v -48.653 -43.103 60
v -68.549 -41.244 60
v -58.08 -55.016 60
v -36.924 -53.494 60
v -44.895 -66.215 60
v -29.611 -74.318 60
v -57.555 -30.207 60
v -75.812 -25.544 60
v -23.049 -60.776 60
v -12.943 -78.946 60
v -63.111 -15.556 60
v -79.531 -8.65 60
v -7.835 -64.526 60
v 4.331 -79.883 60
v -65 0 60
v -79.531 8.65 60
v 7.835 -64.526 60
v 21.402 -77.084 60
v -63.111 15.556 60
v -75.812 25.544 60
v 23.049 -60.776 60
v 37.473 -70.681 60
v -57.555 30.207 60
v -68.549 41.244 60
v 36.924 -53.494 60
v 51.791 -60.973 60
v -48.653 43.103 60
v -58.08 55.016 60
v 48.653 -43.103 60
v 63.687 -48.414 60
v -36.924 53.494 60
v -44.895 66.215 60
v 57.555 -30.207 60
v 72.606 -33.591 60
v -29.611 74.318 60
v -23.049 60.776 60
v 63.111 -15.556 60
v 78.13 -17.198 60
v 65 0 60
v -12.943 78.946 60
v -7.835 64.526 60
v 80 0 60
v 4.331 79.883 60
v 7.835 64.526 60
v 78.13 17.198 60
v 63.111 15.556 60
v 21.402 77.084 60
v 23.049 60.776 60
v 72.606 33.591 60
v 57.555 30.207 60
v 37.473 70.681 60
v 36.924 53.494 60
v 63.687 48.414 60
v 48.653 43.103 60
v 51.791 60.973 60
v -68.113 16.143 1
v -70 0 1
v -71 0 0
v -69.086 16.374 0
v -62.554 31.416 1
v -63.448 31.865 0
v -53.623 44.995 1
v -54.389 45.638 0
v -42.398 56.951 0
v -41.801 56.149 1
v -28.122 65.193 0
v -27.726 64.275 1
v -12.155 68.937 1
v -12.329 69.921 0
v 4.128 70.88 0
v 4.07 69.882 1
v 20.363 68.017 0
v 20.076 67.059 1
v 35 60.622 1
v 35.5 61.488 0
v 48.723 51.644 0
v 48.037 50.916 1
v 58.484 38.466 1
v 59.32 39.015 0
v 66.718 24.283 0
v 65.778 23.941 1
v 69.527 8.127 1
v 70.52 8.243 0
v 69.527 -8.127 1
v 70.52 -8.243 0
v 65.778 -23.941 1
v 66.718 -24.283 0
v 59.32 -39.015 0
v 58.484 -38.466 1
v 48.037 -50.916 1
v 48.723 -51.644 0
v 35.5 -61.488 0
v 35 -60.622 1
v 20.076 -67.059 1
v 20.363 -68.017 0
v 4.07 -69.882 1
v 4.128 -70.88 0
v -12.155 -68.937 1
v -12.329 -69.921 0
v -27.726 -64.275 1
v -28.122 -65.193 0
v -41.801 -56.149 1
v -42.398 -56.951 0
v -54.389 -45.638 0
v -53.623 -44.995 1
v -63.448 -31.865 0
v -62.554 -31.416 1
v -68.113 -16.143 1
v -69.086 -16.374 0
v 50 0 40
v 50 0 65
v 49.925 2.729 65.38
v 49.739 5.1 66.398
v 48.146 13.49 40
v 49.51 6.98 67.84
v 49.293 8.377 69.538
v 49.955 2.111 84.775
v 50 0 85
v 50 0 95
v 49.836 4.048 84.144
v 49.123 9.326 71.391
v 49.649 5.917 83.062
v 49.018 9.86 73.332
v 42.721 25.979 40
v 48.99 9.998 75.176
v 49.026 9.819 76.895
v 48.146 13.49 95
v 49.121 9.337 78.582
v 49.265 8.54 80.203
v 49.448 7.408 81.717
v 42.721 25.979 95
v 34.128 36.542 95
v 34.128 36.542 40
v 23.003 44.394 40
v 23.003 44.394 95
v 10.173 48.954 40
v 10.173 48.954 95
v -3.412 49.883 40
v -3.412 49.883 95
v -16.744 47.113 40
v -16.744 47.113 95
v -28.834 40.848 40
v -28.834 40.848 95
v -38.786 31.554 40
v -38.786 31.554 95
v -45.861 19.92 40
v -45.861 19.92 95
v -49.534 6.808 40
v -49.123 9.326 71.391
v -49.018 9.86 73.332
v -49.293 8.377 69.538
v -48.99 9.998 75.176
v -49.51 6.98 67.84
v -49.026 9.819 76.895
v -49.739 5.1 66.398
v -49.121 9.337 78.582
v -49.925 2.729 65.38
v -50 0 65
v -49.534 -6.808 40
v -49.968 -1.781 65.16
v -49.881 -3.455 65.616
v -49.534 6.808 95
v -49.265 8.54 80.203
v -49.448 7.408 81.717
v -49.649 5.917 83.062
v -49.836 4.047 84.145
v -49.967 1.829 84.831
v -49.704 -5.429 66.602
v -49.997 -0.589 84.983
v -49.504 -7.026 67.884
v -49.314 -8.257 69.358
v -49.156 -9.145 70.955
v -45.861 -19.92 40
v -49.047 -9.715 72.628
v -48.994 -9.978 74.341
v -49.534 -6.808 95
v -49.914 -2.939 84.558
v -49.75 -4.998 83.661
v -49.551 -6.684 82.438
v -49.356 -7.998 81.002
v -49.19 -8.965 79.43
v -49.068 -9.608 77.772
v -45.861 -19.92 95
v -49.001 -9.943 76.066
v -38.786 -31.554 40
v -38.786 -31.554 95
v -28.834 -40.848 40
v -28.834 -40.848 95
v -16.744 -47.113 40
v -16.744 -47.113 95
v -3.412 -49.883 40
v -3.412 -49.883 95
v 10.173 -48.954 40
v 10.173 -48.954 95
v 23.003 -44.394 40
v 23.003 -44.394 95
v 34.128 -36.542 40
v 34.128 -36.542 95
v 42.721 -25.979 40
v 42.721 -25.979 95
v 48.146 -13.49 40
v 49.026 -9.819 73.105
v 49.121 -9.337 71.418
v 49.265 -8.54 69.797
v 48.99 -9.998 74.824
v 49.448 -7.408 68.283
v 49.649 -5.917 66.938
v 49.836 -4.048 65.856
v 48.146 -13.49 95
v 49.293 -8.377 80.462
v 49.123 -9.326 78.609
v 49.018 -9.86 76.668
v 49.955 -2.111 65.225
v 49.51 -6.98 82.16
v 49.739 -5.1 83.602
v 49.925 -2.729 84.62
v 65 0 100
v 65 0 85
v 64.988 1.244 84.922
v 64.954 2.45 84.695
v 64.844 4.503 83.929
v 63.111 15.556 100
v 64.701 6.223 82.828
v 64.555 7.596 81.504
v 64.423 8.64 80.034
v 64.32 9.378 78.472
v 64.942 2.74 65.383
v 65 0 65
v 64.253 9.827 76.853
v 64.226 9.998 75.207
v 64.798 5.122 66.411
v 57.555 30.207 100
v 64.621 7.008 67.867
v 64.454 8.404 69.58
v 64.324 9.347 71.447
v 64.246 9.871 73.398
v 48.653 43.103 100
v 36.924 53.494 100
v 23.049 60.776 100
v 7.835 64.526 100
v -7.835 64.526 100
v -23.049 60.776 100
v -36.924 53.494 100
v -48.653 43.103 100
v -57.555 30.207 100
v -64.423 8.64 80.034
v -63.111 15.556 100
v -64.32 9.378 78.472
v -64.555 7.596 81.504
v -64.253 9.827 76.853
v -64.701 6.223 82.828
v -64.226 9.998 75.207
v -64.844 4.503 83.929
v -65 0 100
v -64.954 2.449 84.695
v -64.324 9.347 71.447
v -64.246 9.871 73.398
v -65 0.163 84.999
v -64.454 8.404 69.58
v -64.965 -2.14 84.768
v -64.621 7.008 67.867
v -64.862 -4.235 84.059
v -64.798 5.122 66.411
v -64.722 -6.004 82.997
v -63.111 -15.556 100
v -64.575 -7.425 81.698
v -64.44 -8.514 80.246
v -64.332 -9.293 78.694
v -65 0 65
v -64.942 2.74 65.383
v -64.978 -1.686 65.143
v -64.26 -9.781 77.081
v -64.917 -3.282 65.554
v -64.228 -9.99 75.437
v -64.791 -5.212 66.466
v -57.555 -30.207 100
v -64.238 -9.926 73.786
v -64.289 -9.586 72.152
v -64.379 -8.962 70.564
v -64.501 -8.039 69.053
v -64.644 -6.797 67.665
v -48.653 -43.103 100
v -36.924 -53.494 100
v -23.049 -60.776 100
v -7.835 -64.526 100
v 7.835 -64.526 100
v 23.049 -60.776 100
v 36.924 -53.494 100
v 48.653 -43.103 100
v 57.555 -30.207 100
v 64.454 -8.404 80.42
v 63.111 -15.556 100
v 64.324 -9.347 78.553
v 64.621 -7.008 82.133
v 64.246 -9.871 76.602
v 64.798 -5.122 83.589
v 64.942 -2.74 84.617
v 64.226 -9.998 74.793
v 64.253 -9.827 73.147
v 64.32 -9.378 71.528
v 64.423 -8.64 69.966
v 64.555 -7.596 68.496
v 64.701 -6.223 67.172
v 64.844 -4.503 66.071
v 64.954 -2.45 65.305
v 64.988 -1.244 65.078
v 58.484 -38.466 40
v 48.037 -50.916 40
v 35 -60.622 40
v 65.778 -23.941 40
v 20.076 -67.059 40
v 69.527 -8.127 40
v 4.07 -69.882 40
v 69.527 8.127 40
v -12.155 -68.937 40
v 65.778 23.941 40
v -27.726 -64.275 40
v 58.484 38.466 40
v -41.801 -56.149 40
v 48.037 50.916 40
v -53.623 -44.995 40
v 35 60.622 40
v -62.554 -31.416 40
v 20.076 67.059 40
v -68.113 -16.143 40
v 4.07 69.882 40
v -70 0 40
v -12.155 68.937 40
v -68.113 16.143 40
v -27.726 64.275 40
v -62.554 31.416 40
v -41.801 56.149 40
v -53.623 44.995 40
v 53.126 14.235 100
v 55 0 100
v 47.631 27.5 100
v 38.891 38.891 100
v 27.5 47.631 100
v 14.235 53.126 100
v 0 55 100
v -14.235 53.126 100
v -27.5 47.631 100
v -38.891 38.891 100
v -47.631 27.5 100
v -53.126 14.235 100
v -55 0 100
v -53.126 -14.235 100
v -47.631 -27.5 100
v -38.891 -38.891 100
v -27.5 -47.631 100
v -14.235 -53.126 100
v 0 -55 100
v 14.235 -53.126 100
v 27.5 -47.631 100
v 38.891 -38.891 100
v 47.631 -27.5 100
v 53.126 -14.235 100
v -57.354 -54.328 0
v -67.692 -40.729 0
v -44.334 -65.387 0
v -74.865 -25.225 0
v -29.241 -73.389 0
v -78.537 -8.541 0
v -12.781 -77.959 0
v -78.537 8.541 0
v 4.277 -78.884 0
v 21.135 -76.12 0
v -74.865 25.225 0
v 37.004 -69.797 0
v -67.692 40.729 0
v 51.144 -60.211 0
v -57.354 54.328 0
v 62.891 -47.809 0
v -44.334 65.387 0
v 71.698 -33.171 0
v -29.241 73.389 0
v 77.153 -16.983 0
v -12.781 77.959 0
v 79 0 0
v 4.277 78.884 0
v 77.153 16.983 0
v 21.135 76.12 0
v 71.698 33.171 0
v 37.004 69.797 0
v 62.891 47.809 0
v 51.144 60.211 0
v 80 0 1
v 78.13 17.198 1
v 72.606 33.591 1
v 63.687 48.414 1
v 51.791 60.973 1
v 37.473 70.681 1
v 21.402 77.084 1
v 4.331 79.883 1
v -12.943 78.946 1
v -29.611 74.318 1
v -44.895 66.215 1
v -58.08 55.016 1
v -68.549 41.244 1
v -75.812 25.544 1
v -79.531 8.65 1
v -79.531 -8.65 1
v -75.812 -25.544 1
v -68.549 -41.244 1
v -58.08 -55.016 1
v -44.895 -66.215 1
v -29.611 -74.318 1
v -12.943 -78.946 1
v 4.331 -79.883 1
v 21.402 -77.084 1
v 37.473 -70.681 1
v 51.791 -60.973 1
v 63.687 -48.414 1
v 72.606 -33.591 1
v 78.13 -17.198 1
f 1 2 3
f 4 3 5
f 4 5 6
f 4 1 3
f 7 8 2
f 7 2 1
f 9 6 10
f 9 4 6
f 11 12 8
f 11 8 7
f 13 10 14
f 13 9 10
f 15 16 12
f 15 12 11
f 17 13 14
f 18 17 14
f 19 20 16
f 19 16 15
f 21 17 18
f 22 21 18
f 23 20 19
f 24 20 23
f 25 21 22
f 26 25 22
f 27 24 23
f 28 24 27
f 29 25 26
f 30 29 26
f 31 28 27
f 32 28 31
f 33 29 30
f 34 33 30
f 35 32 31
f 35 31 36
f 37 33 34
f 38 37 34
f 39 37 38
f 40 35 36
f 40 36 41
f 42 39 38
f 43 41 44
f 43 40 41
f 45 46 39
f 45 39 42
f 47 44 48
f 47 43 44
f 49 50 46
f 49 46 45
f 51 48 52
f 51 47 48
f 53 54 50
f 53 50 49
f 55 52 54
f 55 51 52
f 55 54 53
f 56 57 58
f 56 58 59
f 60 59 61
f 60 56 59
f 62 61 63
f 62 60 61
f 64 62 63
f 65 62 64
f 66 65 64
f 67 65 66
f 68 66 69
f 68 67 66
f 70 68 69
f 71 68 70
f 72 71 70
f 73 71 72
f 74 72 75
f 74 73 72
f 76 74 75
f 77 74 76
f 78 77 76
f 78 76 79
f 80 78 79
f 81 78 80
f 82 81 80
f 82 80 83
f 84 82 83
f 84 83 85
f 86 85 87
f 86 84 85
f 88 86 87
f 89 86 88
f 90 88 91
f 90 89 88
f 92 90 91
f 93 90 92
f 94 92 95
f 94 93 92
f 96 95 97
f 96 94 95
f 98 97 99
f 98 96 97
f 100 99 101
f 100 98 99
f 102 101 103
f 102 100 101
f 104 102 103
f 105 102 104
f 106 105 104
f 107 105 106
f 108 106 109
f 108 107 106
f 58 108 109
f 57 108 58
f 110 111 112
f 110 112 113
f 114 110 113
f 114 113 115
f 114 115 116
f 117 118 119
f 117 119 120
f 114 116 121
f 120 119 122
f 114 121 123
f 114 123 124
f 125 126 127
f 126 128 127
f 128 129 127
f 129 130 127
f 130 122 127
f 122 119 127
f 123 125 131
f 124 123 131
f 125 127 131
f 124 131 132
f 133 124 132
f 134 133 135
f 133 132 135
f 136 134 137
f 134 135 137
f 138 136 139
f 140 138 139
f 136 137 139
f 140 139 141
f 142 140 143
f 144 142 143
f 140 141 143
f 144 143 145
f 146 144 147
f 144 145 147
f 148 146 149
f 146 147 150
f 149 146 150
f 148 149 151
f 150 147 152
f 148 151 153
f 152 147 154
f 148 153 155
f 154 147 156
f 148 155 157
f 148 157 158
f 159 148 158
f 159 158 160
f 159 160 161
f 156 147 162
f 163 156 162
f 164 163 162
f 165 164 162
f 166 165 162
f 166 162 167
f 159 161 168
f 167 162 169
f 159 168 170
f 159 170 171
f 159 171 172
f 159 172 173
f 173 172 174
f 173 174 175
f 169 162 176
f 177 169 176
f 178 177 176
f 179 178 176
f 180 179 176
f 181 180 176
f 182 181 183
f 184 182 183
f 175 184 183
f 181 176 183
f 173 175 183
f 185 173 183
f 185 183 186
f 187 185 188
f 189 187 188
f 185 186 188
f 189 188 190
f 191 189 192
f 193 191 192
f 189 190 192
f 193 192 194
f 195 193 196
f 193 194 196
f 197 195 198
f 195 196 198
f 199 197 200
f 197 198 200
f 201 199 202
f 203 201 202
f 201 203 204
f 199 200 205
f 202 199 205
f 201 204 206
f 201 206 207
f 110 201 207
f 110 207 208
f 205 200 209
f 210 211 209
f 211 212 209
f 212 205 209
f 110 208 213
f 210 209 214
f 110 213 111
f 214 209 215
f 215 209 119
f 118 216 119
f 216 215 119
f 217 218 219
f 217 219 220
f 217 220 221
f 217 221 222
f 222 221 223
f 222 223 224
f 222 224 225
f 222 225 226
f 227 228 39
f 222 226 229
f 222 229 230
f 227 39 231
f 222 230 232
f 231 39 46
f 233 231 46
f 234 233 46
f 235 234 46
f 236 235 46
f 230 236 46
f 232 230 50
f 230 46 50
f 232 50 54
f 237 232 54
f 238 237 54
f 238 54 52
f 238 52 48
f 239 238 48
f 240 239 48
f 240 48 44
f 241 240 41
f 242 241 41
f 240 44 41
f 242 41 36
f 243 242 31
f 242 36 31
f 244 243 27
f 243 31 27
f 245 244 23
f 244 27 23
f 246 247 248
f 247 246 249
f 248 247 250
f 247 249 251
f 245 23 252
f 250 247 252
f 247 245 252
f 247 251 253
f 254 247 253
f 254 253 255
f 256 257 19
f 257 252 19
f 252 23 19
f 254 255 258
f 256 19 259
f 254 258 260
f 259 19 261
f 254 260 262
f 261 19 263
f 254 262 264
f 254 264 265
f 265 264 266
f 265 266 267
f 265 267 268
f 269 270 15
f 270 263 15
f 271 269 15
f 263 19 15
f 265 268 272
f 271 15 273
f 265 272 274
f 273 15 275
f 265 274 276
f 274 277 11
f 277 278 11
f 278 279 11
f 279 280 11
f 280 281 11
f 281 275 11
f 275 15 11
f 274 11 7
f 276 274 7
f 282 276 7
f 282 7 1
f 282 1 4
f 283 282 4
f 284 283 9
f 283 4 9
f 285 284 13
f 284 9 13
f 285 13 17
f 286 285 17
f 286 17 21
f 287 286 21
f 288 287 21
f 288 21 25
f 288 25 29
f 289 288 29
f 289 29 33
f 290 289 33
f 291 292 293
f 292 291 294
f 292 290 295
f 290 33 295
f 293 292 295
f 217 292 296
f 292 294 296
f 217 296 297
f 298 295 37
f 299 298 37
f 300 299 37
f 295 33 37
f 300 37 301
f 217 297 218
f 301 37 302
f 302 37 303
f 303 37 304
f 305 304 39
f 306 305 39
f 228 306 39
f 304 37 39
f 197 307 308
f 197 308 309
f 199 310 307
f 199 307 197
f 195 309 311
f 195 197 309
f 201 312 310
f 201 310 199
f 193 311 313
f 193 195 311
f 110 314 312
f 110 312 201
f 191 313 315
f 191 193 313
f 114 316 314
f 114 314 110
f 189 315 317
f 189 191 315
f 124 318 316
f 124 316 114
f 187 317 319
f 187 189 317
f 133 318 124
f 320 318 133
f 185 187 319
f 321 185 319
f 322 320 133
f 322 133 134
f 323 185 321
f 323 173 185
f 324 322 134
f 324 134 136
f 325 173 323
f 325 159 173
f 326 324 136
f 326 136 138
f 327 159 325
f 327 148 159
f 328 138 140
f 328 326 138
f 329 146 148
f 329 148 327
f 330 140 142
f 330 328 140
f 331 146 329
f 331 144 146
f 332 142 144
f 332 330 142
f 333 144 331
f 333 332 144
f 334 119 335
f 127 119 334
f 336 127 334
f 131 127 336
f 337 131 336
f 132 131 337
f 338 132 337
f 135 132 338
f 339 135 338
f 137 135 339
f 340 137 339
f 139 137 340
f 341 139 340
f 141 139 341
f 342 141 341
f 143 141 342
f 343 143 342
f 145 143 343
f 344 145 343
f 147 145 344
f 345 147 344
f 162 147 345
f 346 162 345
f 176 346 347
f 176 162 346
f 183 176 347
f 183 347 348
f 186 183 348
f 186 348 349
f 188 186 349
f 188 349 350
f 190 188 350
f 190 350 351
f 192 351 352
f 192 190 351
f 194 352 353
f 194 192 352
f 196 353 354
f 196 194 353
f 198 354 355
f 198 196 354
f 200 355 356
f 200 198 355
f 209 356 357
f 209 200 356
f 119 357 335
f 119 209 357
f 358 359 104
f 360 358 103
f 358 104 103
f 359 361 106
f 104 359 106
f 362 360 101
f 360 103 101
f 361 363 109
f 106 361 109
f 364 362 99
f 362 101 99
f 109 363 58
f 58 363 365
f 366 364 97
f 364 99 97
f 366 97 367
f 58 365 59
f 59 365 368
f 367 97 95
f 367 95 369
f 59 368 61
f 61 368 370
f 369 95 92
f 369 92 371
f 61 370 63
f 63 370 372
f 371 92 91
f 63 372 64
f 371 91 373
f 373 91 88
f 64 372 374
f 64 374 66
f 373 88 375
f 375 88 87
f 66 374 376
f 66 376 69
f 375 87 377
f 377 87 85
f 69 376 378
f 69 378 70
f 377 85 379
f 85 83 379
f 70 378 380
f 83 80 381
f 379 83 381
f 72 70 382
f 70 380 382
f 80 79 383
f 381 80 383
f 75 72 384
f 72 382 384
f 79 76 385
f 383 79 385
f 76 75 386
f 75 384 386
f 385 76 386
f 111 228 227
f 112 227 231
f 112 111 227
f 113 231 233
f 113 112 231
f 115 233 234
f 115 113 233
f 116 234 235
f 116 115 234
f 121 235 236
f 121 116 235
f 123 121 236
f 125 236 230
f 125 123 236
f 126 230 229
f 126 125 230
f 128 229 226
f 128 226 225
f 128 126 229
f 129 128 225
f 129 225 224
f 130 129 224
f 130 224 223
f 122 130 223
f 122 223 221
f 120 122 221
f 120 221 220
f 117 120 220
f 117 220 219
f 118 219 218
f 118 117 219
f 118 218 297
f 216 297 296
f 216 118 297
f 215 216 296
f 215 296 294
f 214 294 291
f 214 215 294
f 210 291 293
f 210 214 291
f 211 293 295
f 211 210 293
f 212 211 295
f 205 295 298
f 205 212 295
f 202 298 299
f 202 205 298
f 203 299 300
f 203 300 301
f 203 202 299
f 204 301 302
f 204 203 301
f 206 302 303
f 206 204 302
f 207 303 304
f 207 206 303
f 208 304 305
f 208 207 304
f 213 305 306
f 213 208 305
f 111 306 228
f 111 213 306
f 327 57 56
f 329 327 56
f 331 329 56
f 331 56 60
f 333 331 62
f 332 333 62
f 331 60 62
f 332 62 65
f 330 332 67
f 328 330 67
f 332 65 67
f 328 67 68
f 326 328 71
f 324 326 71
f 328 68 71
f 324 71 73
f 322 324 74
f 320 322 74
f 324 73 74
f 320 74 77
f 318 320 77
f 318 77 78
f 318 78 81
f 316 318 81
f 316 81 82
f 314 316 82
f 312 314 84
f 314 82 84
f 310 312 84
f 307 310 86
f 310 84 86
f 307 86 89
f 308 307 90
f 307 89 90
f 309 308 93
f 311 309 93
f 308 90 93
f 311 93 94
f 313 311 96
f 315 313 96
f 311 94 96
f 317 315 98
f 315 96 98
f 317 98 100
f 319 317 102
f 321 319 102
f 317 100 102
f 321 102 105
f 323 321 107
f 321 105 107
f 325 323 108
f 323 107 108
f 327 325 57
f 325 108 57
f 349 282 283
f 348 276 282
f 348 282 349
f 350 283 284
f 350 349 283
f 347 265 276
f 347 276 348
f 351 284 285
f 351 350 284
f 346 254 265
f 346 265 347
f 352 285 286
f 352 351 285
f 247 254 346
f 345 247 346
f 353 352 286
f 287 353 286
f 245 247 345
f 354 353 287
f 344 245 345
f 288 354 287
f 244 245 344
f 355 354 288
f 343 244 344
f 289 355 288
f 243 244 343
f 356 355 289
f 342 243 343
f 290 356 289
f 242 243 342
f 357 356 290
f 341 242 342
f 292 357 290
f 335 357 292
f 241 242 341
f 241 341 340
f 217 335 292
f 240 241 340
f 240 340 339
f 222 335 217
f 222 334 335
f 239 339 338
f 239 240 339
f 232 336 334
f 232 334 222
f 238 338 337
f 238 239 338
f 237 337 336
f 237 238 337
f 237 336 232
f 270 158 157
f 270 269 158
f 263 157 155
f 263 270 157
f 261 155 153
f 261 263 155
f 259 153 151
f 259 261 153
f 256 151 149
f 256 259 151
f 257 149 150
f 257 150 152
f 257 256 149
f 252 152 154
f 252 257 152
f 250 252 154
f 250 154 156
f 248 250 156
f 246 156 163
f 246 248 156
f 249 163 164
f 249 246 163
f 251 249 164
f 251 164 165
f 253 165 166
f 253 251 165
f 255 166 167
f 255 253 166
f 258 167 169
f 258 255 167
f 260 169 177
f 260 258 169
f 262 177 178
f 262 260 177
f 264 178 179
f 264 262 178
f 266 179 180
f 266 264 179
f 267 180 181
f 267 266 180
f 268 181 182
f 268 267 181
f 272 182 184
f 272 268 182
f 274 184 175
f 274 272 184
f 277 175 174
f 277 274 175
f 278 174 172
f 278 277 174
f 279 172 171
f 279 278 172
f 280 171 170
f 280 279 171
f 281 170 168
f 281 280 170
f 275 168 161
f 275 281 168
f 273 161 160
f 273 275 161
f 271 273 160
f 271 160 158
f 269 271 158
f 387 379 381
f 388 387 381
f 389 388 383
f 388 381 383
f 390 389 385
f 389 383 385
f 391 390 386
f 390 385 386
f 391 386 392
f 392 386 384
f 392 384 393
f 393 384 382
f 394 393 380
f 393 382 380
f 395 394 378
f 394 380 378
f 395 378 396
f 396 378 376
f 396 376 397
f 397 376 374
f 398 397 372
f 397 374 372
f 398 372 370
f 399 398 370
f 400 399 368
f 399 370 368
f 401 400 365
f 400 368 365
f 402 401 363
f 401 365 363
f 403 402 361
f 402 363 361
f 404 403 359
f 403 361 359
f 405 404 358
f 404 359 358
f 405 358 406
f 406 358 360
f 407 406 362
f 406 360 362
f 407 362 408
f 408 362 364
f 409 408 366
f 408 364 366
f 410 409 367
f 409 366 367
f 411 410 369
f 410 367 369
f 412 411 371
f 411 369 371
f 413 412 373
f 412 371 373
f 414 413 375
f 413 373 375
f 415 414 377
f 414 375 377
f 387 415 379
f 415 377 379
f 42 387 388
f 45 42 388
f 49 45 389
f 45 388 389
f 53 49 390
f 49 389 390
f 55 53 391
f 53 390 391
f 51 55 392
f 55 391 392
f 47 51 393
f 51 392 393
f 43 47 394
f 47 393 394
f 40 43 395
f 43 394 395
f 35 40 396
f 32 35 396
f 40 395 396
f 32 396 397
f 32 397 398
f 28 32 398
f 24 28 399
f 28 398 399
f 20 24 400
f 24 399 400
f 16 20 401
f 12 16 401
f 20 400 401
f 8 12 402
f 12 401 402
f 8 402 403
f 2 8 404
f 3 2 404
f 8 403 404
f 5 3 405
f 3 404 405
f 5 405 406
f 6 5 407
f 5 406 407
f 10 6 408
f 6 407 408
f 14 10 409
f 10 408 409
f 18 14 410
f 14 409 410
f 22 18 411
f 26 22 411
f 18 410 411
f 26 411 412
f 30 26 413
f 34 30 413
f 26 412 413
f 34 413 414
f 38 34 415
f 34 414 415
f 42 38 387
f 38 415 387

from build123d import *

# Parameters (mm, degrees)
SKETCH_1_R               = 80
EXTRUDE_1_DEPTH          = 60
SKETCH_2_R               = 65
EXTRUDE_2_DEPTH          = 40
SKETCH_3_R               = 70
CUT_EXTRUDE_1_DEPTH      = 40
SKETCH_4_R               = 50
CUT_EXTRUDE_2_DEPTH      = 151.996688705
CHAMFER_1_SIZE           = 1
CUT_EXTRUDE_3_DEPTH      = 151.996688705
CUT_EXTRUDE_3_DEPTH_BACK = 151.996688705
SKETCH_5_R               = 10
CHAMFER_2_SIZE           = 5


with BuildPart() as part:
    # Эскиз1 → Бобышка-Вытянуть1 (new body)
    with BuildSketch(Plane.XY):
        Circle(SKETCH_1_R)
    extrude(amount=EXTRUDE_1_DEPTH)

    # Эскиз2 → Бобышка-Вытянуть2 (add)
    with BuildSketch(Plane.XY.offset(60)):
        Circle(SKETCH_2_R)
    extrude(amount=EXTRUDE_2_DEPTH)

    # Эскиз3 → Вырез-Вытянуть1 (cut)
    with BuildSketch(Plane(origin=(0, 0, 0), x_dir=(-1, 0, 0), z_dir=(0, 0, -1))):
        Circle(SKETCH_3_R)
    extrude(amount=-CUT_EXTRUDE_1_DEPTH, mode=Mode.SUBTRACT)

    # Эскиз4 → Вырез-Вытянуть2 (cut, through all)
    with BuildSketch(Plane.XY.offset(100)):
        Circle(SKETCH_4_R)
    extrude(amount=-CUT_EXTRUDE_2_DEPTH, mode=Mode.SUBTRACT)

    # Фаска1
    chamfer_1_edges = [part.edges().sort_by_distance(p)[0] for p in [
        (70, 0, 0),
        (-80, 0, 0),
    ]]
    chamfer(chamfer_1_edges, length=CHAMFER_1_SIZE)

    # Эскиз5 → Вырез-Вытянуть3 (cut, two sides: drawn at the far end of the back side and taken through both)
    with BuildSketch(Plane(origin=(0, 0, 0), x_dir=(0, 0, -1), z_dir=(1, 0, 0)).offset(-CUT_EXTRUDE_3_DEPTH_BACK)):
        with Locations((-75, 0)):
            Circle(SKETCH_5_R)
    extrude(amount=CUT_EXTRUDE_3_DEPTH + CUT_EXTRUDE_3_DEPTH_BACK, mode=Mode.SUBTRACT)

    # Фаска2
    chamfer_2_edges = [part.edges().sort_by_distance(p)[0] for p in [
        (-50, 0, 100),
    ]]
    chamfer(chamfer_2_edges, length=CHAMFER_2_SIZE)


solid = part.part
